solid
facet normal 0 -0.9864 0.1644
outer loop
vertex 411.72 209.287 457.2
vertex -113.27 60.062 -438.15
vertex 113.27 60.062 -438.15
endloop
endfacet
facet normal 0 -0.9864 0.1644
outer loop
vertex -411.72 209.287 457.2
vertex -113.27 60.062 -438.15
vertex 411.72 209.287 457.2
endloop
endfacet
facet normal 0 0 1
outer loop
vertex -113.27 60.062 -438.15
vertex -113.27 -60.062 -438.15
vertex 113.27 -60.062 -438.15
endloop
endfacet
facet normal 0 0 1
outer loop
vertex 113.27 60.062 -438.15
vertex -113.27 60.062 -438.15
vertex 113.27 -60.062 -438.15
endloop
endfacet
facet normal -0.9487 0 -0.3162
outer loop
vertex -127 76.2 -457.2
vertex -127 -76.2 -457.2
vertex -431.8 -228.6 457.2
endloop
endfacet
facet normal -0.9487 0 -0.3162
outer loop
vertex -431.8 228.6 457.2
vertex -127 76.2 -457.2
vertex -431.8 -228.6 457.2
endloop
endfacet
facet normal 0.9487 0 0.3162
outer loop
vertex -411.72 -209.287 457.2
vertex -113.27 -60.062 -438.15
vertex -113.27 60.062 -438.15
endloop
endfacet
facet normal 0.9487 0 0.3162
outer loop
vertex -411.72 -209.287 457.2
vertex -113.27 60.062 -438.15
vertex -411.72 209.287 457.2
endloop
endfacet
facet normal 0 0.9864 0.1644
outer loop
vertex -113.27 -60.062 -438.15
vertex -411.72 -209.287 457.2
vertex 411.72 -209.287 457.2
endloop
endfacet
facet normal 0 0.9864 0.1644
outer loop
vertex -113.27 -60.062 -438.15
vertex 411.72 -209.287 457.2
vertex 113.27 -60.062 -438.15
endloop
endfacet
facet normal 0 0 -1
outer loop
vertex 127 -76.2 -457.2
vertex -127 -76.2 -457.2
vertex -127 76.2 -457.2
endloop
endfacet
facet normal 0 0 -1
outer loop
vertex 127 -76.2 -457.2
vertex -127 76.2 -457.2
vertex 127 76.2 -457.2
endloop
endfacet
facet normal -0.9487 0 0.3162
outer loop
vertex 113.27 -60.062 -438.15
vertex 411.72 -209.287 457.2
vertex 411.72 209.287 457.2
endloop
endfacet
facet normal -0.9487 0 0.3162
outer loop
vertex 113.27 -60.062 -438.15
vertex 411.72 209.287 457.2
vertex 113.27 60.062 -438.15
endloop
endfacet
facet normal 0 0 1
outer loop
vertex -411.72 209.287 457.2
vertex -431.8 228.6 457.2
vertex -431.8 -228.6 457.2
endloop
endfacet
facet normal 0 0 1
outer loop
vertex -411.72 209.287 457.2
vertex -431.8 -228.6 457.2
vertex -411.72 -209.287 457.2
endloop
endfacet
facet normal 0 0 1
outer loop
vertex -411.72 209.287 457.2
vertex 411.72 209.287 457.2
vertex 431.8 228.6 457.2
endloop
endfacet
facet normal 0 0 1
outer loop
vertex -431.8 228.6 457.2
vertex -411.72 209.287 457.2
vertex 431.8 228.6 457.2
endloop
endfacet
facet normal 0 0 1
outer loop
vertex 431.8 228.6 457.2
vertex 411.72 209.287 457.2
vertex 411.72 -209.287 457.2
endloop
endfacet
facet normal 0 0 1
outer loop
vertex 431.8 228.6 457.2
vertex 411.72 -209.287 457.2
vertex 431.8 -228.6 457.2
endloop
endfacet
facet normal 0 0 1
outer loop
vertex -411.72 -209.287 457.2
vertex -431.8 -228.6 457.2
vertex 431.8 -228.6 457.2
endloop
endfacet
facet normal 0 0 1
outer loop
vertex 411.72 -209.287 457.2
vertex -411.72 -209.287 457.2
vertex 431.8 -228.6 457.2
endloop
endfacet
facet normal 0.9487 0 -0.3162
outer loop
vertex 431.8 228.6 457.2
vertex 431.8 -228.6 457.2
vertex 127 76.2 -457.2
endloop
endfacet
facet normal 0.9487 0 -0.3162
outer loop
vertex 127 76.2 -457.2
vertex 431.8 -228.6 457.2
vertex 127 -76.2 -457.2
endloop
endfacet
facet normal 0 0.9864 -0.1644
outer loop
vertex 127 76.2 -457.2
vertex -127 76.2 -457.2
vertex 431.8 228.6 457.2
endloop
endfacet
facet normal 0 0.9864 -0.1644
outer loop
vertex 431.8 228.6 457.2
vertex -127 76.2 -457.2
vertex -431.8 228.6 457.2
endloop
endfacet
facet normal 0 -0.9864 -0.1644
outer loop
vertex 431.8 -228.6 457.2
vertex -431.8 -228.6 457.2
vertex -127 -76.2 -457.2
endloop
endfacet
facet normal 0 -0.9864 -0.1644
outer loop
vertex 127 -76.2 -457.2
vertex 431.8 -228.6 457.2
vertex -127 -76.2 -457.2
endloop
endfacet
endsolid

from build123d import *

# Parameters (mm, degrees)
F0_W     = 863.6
F0_H     = 914.4
F1_DEPTH = 228.6
F4_DEPTH = 457.201
F5_DEPTH = 863.601
F6_T     = -19.05


with BuildPart() as f1:
    # F0 (on Front) → F1 (new body, symmetric)
    with BuildSketch(Plane.XZ):
        Rectangle(F0_W, F0_H)
    extrude(amount=F1_DEPTH, both=True)

    # F2 (on face) → F4 (cut, through all)
    with BuildSketch(Plane.XZ.offset(228.6)):
        Polygon((-127, -457.2), (-431.8, 457.2), (-431.8, -457.2), align=None)
        Polygon((431.8, -457.2), (431.8, 457.2), (127, -457.2), align=None)
    extrude(amount=-F4_DEPTH, mode=Mode.SUBTRACT)

    # F3 (on face) → F5 (cut, through all)
    with BuildSketch(Plane(origin=(-431.8, 0, 0), x_dir=(0, -1, 0), z_dir=(-1, 0, 0))):
        Polygon((-76.2, -457.2), (-228.6, 457.2), (-228.6, -457.2), align=None)
        Polygon((228.6, -457.2), (228.6, 457.2), (76.2, -457.2), align=None)
    extrude(amount=-F5_DEPTH, mode=Mode.SUBTRACT)

    # F6
    f6_openings = [f1.faces().sort_by_distance(p)[0] for p in [
        (0, 0, 457.2),
    ]]
    offset(amount=F6_T, openings=f6_openings)


solid = f1.part
